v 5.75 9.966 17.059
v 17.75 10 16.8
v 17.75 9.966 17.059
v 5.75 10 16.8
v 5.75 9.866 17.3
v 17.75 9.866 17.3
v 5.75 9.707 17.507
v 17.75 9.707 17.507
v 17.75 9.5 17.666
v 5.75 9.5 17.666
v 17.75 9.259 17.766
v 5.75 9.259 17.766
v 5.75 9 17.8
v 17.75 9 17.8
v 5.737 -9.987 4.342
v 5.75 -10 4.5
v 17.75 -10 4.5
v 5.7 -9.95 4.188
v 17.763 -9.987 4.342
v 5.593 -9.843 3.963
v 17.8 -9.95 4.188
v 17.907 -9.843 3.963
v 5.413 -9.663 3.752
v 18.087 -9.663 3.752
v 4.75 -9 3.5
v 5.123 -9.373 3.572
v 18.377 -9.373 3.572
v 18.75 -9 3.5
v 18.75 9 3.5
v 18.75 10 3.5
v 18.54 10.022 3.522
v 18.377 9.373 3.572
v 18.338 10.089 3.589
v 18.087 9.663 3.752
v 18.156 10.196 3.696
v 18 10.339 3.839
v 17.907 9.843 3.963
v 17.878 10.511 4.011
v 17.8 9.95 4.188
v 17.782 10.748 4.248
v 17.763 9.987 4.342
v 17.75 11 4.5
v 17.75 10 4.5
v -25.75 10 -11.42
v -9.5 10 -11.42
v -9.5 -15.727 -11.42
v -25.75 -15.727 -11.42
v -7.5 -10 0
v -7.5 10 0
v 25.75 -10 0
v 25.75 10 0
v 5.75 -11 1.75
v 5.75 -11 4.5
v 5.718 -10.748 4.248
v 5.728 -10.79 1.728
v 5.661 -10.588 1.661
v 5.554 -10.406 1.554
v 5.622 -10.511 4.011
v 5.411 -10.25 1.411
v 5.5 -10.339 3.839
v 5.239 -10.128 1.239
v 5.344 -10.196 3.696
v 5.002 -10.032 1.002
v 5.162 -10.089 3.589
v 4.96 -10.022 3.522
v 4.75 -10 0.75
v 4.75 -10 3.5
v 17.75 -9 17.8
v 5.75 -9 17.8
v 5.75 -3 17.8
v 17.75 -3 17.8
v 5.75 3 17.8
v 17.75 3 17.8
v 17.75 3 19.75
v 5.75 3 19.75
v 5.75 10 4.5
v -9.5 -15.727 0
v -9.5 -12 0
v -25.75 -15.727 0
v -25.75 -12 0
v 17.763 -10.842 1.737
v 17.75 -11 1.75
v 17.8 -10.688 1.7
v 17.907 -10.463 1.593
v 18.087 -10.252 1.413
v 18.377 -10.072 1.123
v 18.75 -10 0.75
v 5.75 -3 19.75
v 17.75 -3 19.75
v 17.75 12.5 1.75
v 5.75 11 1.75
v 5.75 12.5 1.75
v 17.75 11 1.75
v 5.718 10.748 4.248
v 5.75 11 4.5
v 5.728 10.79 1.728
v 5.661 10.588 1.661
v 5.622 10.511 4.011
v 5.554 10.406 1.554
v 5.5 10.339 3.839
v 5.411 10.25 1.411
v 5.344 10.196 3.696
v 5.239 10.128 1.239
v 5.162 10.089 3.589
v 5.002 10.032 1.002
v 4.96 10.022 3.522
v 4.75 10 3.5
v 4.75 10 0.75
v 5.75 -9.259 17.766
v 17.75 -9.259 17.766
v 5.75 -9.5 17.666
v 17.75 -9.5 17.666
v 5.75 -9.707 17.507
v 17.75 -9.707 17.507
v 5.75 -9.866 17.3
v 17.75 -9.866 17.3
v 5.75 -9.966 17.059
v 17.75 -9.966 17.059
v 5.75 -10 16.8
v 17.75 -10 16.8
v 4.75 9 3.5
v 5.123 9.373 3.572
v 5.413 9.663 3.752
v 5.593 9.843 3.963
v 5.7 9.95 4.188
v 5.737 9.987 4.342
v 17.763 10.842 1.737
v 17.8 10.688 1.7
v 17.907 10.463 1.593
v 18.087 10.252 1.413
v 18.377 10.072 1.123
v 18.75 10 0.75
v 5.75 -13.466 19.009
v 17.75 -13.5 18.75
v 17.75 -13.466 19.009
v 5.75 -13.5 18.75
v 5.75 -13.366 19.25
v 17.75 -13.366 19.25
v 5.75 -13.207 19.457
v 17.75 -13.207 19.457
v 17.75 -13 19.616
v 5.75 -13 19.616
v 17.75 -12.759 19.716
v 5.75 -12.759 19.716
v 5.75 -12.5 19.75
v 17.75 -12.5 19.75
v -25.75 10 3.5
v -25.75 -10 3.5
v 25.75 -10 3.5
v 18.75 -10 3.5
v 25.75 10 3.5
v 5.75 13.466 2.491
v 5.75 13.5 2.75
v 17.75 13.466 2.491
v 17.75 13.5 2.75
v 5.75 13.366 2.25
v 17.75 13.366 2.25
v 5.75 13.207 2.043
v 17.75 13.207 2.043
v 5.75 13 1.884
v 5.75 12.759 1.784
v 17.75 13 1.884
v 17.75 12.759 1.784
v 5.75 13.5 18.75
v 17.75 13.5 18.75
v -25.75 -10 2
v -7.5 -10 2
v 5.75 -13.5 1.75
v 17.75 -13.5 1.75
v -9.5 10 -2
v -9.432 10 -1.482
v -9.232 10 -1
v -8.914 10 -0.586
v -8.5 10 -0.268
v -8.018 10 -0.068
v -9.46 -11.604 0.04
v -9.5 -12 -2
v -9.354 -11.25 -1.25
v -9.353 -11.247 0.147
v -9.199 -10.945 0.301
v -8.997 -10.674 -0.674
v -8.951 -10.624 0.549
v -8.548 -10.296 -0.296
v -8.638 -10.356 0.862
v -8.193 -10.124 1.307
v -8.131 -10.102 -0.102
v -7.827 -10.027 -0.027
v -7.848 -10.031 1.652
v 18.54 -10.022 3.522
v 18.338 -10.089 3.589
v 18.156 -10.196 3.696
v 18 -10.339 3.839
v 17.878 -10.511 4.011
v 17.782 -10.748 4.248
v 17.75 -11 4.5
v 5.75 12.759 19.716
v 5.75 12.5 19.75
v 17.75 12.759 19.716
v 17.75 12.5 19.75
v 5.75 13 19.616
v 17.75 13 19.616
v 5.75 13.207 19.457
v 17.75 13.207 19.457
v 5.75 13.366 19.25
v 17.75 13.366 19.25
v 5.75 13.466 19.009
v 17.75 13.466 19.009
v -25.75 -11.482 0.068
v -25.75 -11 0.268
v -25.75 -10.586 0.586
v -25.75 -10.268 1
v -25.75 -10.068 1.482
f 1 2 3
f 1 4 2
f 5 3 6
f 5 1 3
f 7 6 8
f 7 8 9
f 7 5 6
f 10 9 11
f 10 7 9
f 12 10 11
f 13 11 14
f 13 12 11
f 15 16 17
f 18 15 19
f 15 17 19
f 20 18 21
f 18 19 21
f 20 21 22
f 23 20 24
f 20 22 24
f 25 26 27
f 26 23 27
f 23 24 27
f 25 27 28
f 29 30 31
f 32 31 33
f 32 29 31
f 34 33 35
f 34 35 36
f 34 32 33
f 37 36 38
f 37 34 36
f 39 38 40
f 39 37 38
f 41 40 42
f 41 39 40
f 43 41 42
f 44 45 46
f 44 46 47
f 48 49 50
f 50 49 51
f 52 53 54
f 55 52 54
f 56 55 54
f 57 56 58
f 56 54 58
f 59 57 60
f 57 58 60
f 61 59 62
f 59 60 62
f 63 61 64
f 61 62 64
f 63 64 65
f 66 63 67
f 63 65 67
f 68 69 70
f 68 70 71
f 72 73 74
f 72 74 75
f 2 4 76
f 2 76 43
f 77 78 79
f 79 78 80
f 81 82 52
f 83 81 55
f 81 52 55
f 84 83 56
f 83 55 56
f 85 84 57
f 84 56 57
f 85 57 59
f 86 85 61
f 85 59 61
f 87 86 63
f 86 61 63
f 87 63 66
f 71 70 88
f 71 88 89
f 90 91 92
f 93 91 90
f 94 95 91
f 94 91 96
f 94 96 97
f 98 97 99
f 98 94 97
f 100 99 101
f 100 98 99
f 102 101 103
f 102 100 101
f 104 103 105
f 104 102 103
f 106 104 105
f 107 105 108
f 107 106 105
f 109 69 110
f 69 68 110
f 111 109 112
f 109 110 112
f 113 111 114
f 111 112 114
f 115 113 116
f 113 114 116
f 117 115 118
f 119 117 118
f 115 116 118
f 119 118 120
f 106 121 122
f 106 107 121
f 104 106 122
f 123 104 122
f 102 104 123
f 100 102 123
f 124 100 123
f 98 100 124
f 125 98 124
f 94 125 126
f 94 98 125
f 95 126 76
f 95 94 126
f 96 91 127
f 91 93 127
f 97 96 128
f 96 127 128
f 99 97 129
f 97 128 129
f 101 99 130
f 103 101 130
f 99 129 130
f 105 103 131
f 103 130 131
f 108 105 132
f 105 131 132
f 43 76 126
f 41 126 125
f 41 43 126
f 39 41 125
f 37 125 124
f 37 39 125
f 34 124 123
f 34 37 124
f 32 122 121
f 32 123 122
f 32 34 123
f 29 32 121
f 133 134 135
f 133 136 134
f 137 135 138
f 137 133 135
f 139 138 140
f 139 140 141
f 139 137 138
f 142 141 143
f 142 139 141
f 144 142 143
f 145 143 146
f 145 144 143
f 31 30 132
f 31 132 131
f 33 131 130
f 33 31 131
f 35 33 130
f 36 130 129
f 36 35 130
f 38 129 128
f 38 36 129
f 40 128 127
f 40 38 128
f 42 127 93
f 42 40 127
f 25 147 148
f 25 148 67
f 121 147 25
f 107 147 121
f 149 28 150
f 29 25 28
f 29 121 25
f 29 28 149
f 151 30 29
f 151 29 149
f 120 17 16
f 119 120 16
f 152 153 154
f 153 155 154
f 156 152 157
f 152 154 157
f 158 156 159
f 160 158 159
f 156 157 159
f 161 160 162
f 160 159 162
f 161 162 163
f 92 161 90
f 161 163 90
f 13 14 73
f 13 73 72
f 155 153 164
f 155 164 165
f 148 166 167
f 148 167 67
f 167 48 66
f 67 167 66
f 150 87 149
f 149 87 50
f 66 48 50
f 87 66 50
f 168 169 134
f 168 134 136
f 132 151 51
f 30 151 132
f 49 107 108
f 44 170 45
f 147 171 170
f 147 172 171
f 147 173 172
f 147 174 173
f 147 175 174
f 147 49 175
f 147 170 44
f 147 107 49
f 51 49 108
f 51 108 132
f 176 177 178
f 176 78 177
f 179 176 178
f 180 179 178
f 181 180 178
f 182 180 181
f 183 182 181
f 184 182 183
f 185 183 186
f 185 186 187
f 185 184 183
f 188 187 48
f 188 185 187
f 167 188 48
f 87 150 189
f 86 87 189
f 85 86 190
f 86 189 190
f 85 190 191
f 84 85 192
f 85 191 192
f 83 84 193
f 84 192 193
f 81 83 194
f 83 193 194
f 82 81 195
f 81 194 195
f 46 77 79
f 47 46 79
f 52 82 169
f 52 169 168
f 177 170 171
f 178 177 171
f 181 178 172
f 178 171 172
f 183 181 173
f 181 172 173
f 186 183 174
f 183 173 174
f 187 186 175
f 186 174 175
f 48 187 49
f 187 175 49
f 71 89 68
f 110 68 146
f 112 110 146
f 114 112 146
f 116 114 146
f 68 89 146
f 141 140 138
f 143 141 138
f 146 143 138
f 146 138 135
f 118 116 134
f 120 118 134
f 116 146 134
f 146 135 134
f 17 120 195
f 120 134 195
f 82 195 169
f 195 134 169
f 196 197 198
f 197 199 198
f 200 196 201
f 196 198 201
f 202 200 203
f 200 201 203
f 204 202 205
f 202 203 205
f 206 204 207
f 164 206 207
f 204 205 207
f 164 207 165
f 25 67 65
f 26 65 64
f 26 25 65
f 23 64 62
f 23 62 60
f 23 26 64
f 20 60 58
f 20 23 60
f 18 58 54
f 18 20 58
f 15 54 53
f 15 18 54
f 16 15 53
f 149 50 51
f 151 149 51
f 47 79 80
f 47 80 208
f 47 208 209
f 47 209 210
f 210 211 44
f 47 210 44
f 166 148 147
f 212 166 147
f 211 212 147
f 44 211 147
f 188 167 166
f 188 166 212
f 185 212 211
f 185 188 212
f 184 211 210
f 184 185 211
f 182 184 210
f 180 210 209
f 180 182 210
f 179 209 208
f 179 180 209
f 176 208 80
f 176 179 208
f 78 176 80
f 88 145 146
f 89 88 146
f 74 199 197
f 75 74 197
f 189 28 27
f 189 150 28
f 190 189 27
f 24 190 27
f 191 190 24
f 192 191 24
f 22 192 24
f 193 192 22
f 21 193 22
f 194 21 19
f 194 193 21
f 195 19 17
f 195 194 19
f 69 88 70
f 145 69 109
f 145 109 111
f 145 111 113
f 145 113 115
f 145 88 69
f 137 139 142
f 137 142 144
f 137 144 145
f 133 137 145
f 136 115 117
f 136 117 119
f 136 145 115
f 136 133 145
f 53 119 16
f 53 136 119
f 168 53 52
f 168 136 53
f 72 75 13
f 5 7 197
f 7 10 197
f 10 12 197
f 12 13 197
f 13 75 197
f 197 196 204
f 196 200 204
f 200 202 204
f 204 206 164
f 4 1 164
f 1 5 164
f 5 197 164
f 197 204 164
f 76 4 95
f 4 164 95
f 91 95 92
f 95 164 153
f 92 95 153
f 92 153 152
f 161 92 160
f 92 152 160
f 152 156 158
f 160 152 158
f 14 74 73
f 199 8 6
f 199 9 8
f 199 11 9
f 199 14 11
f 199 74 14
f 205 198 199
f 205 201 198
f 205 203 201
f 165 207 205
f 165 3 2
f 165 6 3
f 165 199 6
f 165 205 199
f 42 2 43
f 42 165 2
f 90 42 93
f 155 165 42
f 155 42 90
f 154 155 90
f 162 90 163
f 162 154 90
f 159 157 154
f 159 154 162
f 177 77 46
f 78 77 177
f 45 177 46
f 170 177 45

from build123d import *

# Parameters (mm, degrees)
SKETCH1_W           = 51.5
SKETCH1_H           = 20
BOSS_EXTRUDE1_DEPTH = 3.5
SKETCH2_W           = 12
SKETCH2_H           = 18
BOSS_EXTRUDE2_DEPTH = 3.5
FILLET1_R           = 1
FILLET2_R           = 1
SKETCH3_W           = 12
SKETCH3_H           = 18
BOSS_EXTRUDE3_DEPTH = 3.5
FILLET3_R           = 1
FILLET4_R           = 1
FILLET5_R           = 1
FILLET6_R           = 1
FILLET7_R           = 1
FILLET8_R           = 1
FILLET9_R           = 1
FILLET10_R          = 1
FILLET11_R          = 1
FILLET12_R          = 1
SKETCH4_W           = 12
SKETCH4_H           = 1.95
BOSS_EXTRUDE4_DEPTH = 7
SKETCH5_W           = 12
SKETCH5_H           = 1.95
BOSS_EXTRUDE5_DEPTH = 7
FILLET13_R          = 1
FILLET14_R          = 1
FILLET15_R          = 1
FILLET16_R          = 1
FILLET17_R          = 1
SKETCH8_W           = 16.25
SKETCH8_H           = 25.726511914
BOSS_EXTRUDE6_DEPTH = 11.42
FILLET21_R          = 2
FILLET22_R          = 2
FILLET23_R          = 2


with BuildPart() as part:
    # Sketch1 → Boss-Extrude1 (new body)
    with BuildSketch(Plane.XY):
        Rectangle(SKETCH1_W, SKETCH1_H)
    extrude(amount=BOSS_EXTRUDE1_DEPTH)

    # Sketch2 → Boss-Extrude2 (add)
    with BuildSketch(Plane(origin=(0, 10, 0), x_dir=(1, 0, 0), z_dir=(0, 1, 0))):
        with Locations((11.75, -10.75)):
            Rectangle(SKETCH2_W, SKETCH2_H)
    extrude(amount=BOSS_EXTRUDE2_DEPTH)

    # Fillet1
    fillet1_edges = [part.edges().sort_by_distance(p)[0] for p in [
        (11.75, 10, 1.75),
    ]]
    fillet(fillet1_edges, radius=FILLET1_R)

    # Fillet2
    fillet2_edges = [part.edges().sort_by_distance(p)[0] for p in [
        (11.75, 10, 3.5),
    ]]
    fillet(fillet2_edges, radius=FILLET2_R)

    # Sketch3 → Boss-Extrude3 (add)
    with BuildSketch(Plane(origin=(0, -10, 0), x_dir=(-1, 0, 0), z_dir=(0, -1, 0))):
        with Locations((-11.75, -10.75)):
            Rectangle(SKETCH3_W, SKETCH3_H)
    extrude(amount=BOSS_EXTRUDE3_DEPTH)

    # Fillet3
    fillet3_edges = [part.edges().sort_by_distance(p)[0] for p in [
        (11.75, -10, 1.75),
    ]]
    fillet(fillet3_edges, radius=FILLET3_R)

    # Fillet4
    fillet4_edges = [part.edges().sort_by_distance(p)[0] for p in [
        (11.75, -10, 3.5),
    ]]
    fillet(fillet4_edges, radius=FILLET4_R)

    # Fillet5
    fillet5_edges = [part.edges().sort_by_distance(p)[0] for p in [
        (17.75, 10, 2.125),
    ]]
    fillet(fillet5_edges, radius=FILLET5_R)

    # Fillet6
    fillet6_edges = [part.edges().sort_by_distance(p)[0] for p in [
        (5.75, 10, 2.125),
    ]]
    fillet(fillet6_edges, radius=FILLET6_R)

    # Fillet7
    fillet7_edges = [part.edges().sort_by_distance(p)[0] for p in [
        (17.75, 10, 3.5),
    ]]
    fillet(fillet7_edges, radius=FILLET7_R)

    # Fillet8
    fillet8_edges = [part.edges().sort_by_distance(p)[0] for p in [
        (5.75, 10, 3.5),
    ]]
    fillet(fillet8_edges, radius=FILLET8_R)

    # Fillet9
    fillet9_edges = [part.edges().sort_by_distance(p)[0] for p in [
        (5.75, -10, 2.125),
    ]]
    fillet(fillet9_edges, radius=FILLET9_R)

    # Fillet10
    fillet10_edges = [part.edges().sort_by_distance(p)[0] for p in [
        (5.75, -10, 3.5),
    ]]
    fillet(fillet10_edges, radius=FILLET10_R)

    # Fillet11
    fillet11_edges = [part.edges().sort_by_distance(p)[0] for p in [
        (17.75, -10, 2.125),
    ]]
    fillet(fillet11_edges, radius=FILLET11_R)

    # Fillet12
    fillet12_edges = [part.edges().sort_by_distance(p)[0] for p in [
        (17.75, -10, 3.5),
    ]]
    fillet(fillet12_edges, radius=FILLET12_R)

    # Sketch4 → Boss-Extrude4 (add)
    with BuildSketch(Plane(origin=(0, -10, 0), x_dir=(1, 0, 0), z_dir=(0, 1, 0))):
        with Locations((11.75, -18.775)):
            Rectangle(SKETCH4_W, SKETCH4_H)
    extrude(amount=BOSS_EXTRUDE4_DEPTH)

    # Sketch5 → Boss-Extrude5 (add)
    with BuildSketch(Plane(origin=(0, 10, 0), x_dir=(-1, 0, 0), z_dir=(0, -1, 0))):
        with Locations((-11.75, -18.775)):
            Rectangle(SKETCH5_W, SKETCH5_H)
    extrude(amount=BOSS_EXTRUDE5_DEPTH)

    # Fillet13
    fillet13_edges = [part.edges().sort_by_distance(p)[0] for p in [
        (11.75, 10, 17.8),
    ]]
    fillet(fillet13_edges, radius=FILLET13_R)

    # Fillet14
    fillet14_edges = [part.edges().sort_by_distance(p)[0] for p in [
        (11.75, 13.5, 19.75),
    ]]
    fillet(fillet14_edges, radius=FILLET14_R)

    # Fillet15
    fillet15_edges = [part.edges().sort_by_distance(p)[0] for p in [
        (11.75, 13.5, 1.75),
    ]]
    fillet(fillet15_edges, radius=FILLET15_R)

    # Fillet16
    fillet16_edges = [part.edges().sort_by_distance(p)[0] for p in [
        (11.75, -13.5, 19.75),
    ]]
    fillet(fillet16_edges, radius=FILLET16_R)

    # Fillet17
    fillet17_edges = [part.edges().sort_by_distance(p)[0] for p in [
        (11.75, -10, 17.8),
    ]]
    fillet(fillet17_edges, radius=FILLET17_R)

    # Sketch8 → Boss-Extrude6 (add)
    with BuildSketch(Plane(origin=(0, 0, 0), x_dir=(-1, 0, 0), z_dir=(0, 0, -1))):
        with Locations((17.625, -2.863255957)):
            Rectangle(SKETCH8_W, SKETCH8_H)
    extrude(amount=BOSS_EXTRUDE6_DEPTH)

    # Fillet21
    fillet21_edges = [part.edges().sort_by_distance(p)[0] for p in [
        (-9.5, 0, 0),
    ]]
    fillet(fillet21_edges, radius=FILLET21_R)

    # Fillet22
    fillet22_edges = [part.edges().sort_by_distance(p)[0] for p in [
        (-17.625, -10, 0),
    ]]
    fillet(fillet22_edges, radius=FILLET22_R)

    # Fillet23
    fillet23_edges = [part.edges().sort_by_distance(p)[0] for p in [
        (-9.5, -10, 0),
    ]]
    fillet(fillet23_edges, radius=FILLET23_R - 0.0001)  # a hair under: the kernel refuses the full size


solid = part.part
